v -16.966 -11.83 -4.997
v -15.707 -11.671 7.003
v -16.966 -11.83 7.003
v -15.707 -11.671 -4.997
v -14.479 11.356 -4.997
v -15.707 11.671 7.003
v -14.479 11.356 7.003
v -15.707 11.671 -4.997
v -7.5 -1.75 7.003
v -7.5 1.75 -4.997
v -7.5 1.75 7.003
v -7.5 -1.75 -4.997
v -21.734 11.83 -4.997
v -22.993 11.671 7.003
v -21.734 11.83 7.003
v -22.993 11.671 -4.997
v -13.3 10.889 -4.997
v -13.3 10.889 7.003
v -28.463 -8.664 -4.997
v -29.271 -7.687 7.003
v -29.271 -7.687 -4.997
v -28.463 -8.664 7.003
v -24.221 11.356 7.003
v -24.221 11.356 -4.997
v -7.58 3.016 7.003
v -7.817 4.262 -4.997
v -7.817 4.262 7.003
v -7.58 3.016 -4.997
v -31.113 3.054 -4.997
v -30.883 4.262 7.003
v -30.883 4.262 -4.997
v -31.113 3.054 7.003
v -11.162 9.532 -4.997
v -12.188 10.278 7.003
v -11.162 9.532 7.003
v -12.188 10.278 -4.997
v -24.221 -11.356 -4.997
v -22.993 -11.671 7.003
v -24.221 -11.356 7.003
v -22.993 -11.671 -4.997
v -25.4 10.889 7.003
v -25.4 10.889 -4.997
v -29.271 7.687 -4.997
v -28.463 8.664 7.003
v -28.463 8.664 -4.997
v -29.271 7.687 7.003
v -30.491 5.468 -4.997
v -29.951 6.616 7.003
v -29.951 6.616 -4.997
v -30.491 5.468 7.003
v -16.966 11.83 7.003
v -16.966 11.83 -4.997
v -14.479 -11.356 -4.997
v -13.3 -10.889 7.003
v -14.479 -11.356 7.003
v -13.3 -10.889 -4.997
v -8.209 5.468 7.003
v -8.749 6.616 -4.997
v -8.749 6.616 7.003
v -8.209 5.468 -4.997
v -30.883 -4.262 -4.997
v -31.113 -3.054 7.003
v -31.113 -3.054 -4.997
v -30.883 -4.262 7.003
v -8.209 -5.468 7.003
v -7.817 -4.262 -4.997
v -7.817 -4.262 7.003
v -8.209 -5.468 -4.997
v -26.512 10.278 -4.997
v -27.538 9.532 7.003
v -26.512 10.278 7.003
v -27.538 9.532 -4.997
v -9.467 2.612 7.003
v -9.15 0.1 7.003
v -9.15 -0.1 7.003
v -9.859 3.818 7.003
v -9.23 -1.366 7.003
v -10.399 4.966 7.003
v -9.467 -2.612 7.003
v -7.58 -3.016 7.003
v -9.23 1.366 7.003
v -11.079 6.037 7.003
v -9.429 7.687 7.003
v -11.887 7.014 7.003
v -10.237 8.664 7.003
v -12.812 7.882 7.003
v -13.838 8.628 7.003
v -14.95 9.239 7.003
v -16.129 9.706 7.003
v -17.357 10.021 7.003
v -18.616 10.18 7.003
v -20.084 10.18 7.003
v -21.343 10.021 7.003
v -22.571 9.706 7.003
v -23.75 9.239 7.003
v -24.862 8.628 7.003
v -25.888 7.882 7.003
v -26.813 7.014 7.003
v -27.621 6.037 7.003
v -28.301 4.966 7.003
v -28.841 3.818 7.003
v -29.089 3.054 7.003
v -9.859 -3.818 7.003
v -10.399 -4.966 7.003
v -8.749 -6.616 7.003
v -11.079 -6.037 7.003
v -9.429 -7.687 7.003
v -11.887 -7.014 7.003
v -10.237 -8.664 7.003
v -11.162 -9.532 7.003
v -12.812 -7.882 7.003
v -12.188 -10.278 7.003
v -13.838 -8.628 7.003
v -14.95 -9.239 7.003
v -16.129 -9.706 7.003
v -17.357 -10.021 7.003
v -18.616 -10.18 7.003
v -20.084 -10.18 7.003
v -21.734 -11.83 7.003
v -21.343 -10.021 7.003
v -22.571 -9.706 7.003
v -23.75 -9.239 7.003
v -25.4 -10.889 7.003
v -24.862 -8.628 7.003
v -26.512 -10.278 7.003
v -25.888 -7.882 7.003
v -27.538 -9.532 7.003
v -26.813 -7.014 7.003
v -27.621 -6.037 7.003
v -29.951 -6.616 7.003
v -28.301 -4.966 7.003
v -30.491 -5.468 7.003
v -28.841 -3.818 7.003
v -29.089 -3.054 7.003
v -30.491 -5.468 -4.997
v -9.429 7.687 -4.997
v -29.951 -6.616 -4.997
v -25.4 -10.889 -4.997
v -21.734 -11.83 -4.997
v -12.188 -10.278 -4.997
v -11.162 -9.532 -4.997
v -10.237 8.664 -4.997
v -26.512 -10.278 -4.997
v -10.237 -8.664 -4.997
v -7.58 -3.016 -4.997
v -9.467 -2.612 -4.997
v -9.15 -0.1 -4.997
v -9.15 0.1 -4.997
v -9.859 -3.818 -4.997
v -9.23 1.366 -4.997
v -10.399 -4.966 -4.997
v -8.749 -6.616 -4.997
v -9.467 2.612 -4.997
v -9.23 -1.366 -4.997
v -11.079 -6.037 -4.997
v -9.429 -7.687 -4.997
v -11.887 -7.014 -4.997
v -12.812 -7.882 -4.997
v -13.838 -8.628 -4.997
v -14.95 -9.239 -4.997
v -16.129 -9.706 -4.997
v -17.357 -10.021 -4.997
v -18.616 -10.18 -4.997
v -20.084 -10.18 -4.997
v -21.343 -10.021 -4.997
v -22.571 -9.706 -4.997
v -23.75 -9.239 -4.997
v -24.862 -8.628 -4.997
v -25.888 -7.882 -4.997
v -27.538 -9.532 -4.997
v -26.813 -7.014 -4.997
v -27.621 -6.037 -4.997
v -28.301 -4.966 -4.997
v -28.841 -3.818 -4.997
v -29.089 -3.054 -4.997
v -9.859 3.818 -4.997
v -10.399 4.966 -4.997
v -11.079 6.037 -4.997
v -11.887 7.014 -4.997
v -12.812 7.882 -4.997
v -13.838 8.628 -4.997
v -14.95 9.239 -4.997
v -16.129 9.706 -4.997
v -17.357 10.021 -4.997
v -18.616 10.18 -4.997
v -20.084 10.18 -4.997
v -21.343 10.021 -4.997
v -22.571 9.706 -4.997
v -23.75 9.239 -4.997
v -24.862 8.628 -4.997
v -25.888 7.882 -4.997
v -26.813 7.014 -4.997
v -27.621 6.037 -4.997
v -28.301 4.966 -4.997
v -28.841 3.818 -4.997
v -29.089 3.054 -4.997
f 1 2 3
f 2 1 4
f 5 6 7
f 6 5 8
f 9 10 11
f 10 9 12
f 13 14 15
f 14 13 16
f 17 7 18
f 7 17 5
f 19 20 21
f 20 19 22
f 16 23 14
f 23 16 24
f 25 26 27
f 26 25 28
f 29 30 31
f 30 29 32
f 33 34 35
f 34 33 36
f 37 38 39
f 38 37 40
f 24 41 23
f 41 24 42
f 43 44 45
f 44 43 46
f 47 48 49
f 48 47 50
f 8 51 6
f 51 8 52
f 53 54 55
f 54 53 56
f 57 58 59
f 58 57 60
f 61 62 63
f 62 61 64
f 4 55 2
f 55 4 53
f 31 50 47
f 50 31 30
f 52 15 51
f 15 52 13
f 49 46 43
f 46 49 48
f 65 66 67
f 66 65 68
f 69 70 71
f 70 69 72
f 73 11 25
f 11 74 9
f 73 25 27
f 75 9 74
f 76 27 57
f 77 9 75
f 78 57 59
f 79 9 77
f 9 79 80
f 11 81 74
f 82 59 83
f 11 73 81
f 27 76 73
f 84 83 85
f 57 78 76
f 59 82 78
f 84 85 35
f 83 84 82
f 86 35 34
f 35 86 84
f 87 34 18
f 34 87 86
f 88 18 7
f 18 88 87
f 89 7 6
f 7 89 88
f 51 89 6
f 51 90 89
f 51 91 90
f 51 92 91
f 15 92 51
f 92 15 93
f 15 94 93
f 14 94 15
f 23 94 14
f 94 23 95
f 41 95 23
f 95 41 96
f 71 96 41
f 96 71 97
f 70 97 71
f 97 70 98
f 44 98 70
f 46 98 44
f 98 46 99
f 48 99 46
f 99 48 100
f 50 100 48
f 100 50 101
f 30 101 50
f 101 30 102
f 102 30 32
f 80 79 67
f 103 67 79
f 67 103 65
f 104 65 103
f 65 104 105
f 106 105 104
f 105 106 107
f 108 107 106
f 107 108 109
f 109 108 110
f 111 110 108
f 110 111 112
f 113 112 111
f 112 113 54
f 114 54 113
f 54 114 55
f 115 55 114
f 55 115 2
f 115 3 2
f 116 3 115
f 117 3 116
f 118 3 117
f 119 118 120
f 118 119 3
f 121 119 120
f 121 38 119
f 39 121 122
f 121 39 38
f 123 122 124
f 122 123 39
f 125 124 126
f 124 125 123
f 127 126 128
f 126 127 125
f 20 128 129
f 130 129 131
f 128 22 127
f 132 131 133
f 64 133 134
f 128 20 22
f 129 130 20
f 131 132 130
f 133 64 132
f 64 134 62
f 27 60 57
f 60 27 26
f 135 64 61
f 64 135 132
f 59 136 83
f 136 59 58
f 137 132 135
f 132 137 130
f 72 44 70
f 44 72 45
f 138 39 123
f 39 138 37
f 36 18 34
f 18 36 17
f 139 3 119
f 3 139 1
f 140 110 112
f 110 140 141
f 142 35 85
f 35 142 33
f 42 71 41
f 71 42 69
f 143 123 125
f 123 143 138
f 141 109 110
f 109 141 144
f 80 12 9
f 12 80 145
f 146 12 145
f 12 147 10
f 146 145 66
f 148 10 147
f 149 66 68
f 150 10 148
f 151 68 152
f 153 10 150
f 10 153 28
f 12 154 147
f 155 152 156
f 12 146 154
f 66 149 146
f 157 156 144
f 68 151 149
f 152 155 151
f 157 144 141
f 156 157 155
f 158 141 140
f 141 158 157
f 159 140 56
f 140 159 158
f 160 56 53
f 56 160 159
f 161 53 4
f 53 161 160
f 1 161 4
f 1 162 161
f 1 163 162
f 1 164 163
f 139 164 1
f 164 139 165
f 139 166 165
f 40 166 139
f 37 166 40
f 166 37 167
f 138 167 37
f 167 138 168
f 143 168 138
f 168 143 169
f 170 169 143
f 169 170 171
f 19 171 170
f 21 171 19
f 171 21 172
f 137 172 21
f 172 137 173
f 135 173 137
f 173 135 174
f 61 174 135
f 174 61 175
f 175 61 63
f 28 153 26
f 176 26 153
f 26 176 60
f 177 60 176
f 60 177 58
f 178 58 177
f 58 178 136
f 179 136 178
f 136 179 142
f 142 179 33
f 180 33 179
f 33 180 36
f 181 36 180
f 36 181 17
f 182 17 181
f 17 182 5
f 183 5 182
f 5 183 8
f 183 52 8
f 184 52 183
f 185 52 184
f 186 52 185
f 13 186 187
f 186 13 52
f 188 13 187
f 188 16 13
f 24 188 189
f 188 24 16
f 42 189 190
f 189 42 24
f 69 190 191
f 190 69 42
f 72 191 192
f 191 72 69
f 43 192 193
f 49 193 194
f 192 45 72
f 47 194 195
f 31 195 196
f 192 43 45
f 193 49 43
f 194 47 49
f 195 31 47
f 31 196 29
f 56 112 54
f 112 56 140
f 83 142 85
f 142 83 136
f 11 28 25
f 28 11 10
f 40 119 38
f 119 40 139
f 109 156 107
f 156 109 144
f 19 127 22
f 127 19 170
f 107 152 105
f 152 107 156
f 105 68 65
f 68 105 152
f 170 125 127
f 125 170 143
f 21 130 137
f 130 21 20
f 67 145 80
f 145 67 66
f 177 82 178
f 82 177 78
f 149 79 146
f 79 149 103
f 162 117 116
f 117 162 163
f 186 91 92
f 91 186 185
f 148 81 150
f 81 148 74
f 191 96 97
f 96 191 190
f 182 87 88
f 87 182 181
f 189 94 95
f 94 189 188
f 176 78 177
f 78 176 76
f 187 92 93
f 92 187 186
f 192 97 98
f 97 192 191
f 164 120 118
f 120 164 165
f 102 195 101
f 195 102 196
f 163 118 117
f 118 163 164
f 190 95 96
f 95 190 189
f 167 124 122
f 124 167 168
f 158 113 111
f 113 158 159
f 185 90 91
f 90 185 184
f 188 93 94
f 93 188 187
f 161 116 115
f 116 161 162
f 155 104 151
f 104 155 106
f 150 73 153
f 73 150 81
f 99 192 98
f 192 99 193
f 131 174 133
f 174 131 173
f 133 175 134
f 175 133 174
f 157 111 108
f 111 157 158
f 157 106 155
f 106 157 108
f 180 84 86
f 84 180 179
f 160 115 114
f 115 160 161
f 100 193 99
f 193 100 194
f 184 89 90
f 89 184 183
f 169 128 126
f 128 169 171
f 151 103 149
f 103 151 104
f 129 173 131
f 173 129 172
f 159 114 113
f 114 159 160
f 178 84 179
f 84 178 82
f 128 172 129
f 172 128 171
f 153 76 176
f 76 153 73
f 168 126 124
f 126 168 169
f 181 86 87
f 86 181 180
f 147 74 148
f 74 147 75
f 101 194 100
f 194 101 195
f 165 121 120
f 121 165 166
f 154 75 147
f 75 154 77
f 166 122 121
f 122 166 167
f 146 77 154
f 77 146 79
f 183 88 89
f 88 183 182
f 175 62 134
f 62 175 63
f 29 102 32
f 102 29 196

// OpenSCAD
// PEGSTR - Pegboard Wizard
// Design by Marius Gheorghescu, November 2014
// Update log:
// November 9th 2014
//		- first coomplete version. Angled holders are often odd/incorrect.
// November 15th 2014
//		- minor tweaks to increase rendering speed. added logo. 
// November 28th 2014
//		- bug fixes

// September 29th 2019
//      - added x and y offset customization       

// TODO - update to make an option for screw mounts instead of pegs

// TODO - offset seems to break it when holder_angle != 0

// preview[view:north, tilt:bottom diagonal]

// size of the the orifice
holder_x_size = 20;
holder_y_size = 20;

// hight of the holder
holder_height = 12;

// how thick are the walls. Hint: 6*extrusion width produces the best results.
wall_thickness = 1.85;

// how many times to repeat the holder on each axis
holder_x_count = 1;
holder_y_count = 1;

// how much space to put between the orifices
holder_x_space = 0;
holder_y_space = 0;

// orifice corner radius (roundness). Needs to be less than min(x,y)/2.
corner_radius = 20;

// Use values less than 1.0 to make the bottom of the holder narrow
taper_ratio = 1;

/* [Advanced] */

// offset from the peg board, typically 0 unless you have an object that needs clearance
holder_offset = 5;

// what ratio of the holders bottom is reinforced to the plate [0.0-1.0]
strength_factor = .66;

// for bins: what ratio of wall thickness to use for closing the bottom
closed_bottom = 0;

// what percentage to cut in the front (example to slip in a cable or make the tool snap from the side)
holder_cutout_side = 0.3;

// set an angle for the holder to prevent object from sliding or to view it better from the top
holder_angle = 0;


/* [Hidden] */

// what is the $fn parameter
holder_sides = max(50, min(20, holder_x_size*2));

// dimensions the same outside US?
hole_spacing = 25.4;
hole_size = 6.0035;
board_thickness = 5;


holder_total_x = wall_thickness + holder_x_count*(wall_thickness+holder_x_size) + (holder_x_count-1)*holder_x_space;
holder_total_y = wall_thickness + holder_y_count*(wall_thickness+holder_y_size) + (holder_y_count-1)*holder_y_space;
holder_total_z = round(holder_height/hole_spacing)*hole_spacing;
holder_roundness = min(corner_radius, holder_x_size/2, holder_y_size/2); 


// what is the $fn parameter for holders
fn = 32;

epsilon = 0.1;

clip_height = 2*hole_size + 2;
$fn = fn;

module round_rect_ex(x1, y1, x2, y2, z, r1, r2)
{
	$fn=holder_sides;
	brim = z/10;

	//rotate([0,0,(holder_sides==6)?30:((holder_sides==4)?45:0)])
	hull() {
        translate([-x1/2 + r1, y1/2 - r1, z/2-brim/2])
            cylinder(r=r1, h=brim,center=true);
        translate([x1/2 - r1, y1/2 - r1, z/2-brim/2])
            cylinder(r=r1, h=brim,center=true);
        translate([-x1/2 + r1, -y1/2 + r1, z/2-brim/2])
            cylinder(r=r1, h=brim,center=true);
        translate([x1/2 - r1, -y1/2 + r1, z/2-brim/2])
            cylinder(r=r1, h=brim,center=true);

        translate([-x2/2 + r2, y2/2 - r2, -z/2+brim/2])
            cylinder(r=r2, h=brim,center=true);
        translate([x2/2 - r2, y2/2 - r2, -z/2+brim/2])
            cylinder(r=r2, h=brim,center=true);
        translate([-x2/2 + r2, -y2/2 + r2, -z/2+brim/2])
            cylinder(r=r2, h=brim,center=true);
        translate([x2/2 - r2, -y2/2 + r2, -z/2+brim/2])
            cylinder(r=r2, h=brim,center=true);

    }
}

module pin(clip)
{
/* param clip: boolean
        if true, make a top clip, if false, make a standard peg
*/
	rotate([0,0,15])
	cylinder(r=hole_size/2, h=board_thickness*1.5+epsilon, center=true, $fn=12);

	if (clip) {
		//
		rotate([0,0,90])
		intersection() {
			translate([0, 0, hole_size-epsilon])
				cube([hole_size+2*epsilon, clip_height, 2*hole_size], center=true);

			// [-hole_size/2 - 1.95,0, board_thickness/2]
			translate([0, hole_size/2 + 2, board_thickness/2]) 
				rotate([0, 90, 0])
				rotate_extrude(convexity = 5, $fn=20)
				translate([5, 0, 0])
				 circle(r = (hole_size*0.95)/2); 
			
			translate([0, hole_size/2 + 2 - 1.6, board_thickness/2]) 
				rotate([45,0,0])
				translate([0, -0, hole_size*0.6])
					cube([hole_size+2*epsilon, 3*hole_size, hole_size], center=true);
		}
	}
}

module pinboard_clips() 
{
/*  make all the pins based on the size of the holder.
    
*/
	rotate([0,90,0])
	for(i=[0:round(holder_total_x/hole_spacing)]) {
		for(j=[0:max(strength_factor, round(holder_height/hole_spacing))]) {

			translate([
				j*hole_spacing, 
				-hole_spacing*(round(holder_total_x/hole_spacing)/2) + i*hole_spacing, 
				0])
					pin(j==0);
		}
	}
}

module pinboard(clips)
{
/*
    create the plate that the pins and clips attach to
    pins and clips and plate holding it all together
*/
	rotate([0,90,0])
	translate([-epsilon, 0, -wall_thickness - board_thickness/2 + epsilon])
	hull() {
		translate([-clip_height/2 + hole_size/2, 
			-hole_spacing*(round(holder_total_x/hole_spacing)/2),0])
			cylinder(r=hole_size/2, h=wall_thickness);

		translate([-clip_height/2 + hole_size/2, 
			hole_spacing*(round(holder_total_x/hole_spacing)/2),0])
			cylinder(r=hole_size/2,  h=wall_thickness);

		translate([max(strength_factor, round(holder_height/hole_spacing))*hole_spacing,
			-hole_spacing*(round(holder_total_x/hole_spacing)/2),0])
			cylinder(r=hole_size/2, h=wall_thickness);

		translate([max(strength_factor, round(holder_height/hole_spacing))*hole_spacing,
			hole_spacing*(round(holder_total_x/hole_spacing)/2),0])
			cylinder(r=hole_size/2,  h=wall_thickness);

	}
}

module holder(negative)
{
/*
    create the actual holder, but no bottoms or anything
    
*/
	for(x=[1:holder_x_count]){
		for(y=[1:holder_y_count]) 
/*		render(convexity=2)*/ {
            // translate to the last 
			translate([
				-holder_total_y /*- (holder_y_size+wall_thickness)/2*/ + y*(holder_y_size+wall_thickness) + wall_thickness + (y-1)*holder_y_space,

				-holder_total_x/2 + (holder_x_size+wall_thickness)/2 + (x-1)*(holder_x_size+wall_thickness) + wall_thickness/2 + (x-1)*holder_x_space,
				 0])			
	{
		rotate([0, holder_angle, 0])
		translate([
			-wall_thickness*abs(sin(holder_angle))-0*abs((holder_y_size/2)*sin(holder_angle))-holder_offset-(holder_y_size + 2*wall_thickness)/2 - board_thickness/2,
			0,
			-(holder_height/2)*sin(holder_angle) - holder_height/2 + clip_height/2
		])
		difference() {
			if (!negative)

				round_rect_ex(
					(holder_y_size + 2*wall_thickness), 
					holder_x_size + 2*wall_thickness, 
					(holder_y_size + 2*wall_thickness)*taper_ratio, 
					(holder_x_size + 2*wall_thickness)*taper_ratio, 
					holder_height, 
					holder_roundness + epsilon, 
					holder_roundness*taper_ratio + epsilon);

				translate([0,0,closed_bottom*wall_thickness])

				if (negative>1) {
					round_rect_ex(
						holder_y_size*taper_ratio, 
						holder_x_size*taper_ratio, 
						holder_y_size*taper_ratio, 
						holder_x_size*taper_ratio, 
						3*max(holder_height, hole_spacing),
						holder_roundness*taper_ratio + epsilon, 
						holder_roundness*taper_ratio + epsilon);
				} else {
					round_rect_ex(
						holder_y_size, 
						holder_x_size, 
						holder_y_size*taper_ratio, 
						holder_x_size*taper_ratio, 
						holder_height+2*epsilon,
						holder_roundness + epsilon, 
						holder_roundness*taper_ratio + epsilon);
				}

			if (!negative)
				if (holder_cutout_side > 0) {

				if (negative>1) {
					hull() {
						scale([1.0, holder_cutout_side, 1.0])
		 					round_rect_ex(
							holder_y_size*taper_ratio, 
							holder_x_size*taper_ratio, 
							holder_y_size*taper_ratio, 
							holder_x_size*taper_ratio, 
							3*max(holder_height, hole_spacing),
							holder_roundness*taper_ratio + epsilon, 
							holder_roundness*taper_ratio + epsilon);
		
						translate([0-(holder_y_size + 2*wall_thickness), 0,0])
						scale([1.0, holder_cutout_side, 1.0])
		 					round_rect_ex(
							holder_y_size*taper_ratio, 
							holder_x_size*taper_ratio, 
							holder_y_size*taper_ratio, 
							holder_x_size*taper_ratio, 
							3*max(holder_height, hole_spacing),
							holder_roundness*taper_ratio + epsilon, 
							holder_roundness*taper_ratio + epsilon);
					}
				} else {
					hull() {
						scale([1.0, holder_cutout_side, 1.0])
		 					round_rect_ex(
							holder_y_size, 
							holder_x_size, 
							holder_y_size*taper_ratio, 
							holder_x_size*taper_ratio, 
							holder_height+2*epsilon,
							holder_roundness + epsilon, 
							holder_roundness*taper_ratio + epsilon);
		
						translate([0-(holder_y_size + 2*wall_thickness), 0,0])
						scale([1.0, holder_cutout_side, 1.0])
		 					round_rect_ex(
							holder_y_size, 
							holder_x_size, 
							holder_y_size*taper_ratio, 
							holder_x_size*taper_ratio, 
							holder_height+2*epsilon,
							holder_roundness + epsilon, 
							holder_roundness*taper_ratio + epsilon);
						}
					}

				}
			}
		} // positioning
	} // for y
	} // for X
}


module pegstr() 
{
	difference() {
		union() {
            
            // create the pinboard
			pinboard();


            // create the overall shape of the holder
			difference() {
				hull() {
					pinboard();
	
					intersection() {
                        // TODO - this didn't work when closed bottom was 1 and strength factor was < 0.5 - there would be no bottom. 
                        // old translate had (strength_factor-.5). look into it and make it more robust
                        // the current way with +.5 screws with the cutout
						translate([-holder_offset - (strength_factor+.5)*holder_total_y - wall_thickness/4 - holder_y_space*(holder_y_count-1),0,0])
						cube([
							holder_total_y + 2*wall_thickness, 
							holder_total_x + wall_thickness, 
							2*holder_height
						], center=true);
	
						!holder(0);
	
					}	
				}

				if (closed_bottom*wall_thickness < epsilon) {
						holder(2);
				}

			}

			color([1,0,0])
			difference() {
				holder(0);
				holder(2);
			}

			color([1,0,0])
				pinboard_clips();
		}
        
		holder(1);

	}
}


rotate([180,0,0]) pegstr();
